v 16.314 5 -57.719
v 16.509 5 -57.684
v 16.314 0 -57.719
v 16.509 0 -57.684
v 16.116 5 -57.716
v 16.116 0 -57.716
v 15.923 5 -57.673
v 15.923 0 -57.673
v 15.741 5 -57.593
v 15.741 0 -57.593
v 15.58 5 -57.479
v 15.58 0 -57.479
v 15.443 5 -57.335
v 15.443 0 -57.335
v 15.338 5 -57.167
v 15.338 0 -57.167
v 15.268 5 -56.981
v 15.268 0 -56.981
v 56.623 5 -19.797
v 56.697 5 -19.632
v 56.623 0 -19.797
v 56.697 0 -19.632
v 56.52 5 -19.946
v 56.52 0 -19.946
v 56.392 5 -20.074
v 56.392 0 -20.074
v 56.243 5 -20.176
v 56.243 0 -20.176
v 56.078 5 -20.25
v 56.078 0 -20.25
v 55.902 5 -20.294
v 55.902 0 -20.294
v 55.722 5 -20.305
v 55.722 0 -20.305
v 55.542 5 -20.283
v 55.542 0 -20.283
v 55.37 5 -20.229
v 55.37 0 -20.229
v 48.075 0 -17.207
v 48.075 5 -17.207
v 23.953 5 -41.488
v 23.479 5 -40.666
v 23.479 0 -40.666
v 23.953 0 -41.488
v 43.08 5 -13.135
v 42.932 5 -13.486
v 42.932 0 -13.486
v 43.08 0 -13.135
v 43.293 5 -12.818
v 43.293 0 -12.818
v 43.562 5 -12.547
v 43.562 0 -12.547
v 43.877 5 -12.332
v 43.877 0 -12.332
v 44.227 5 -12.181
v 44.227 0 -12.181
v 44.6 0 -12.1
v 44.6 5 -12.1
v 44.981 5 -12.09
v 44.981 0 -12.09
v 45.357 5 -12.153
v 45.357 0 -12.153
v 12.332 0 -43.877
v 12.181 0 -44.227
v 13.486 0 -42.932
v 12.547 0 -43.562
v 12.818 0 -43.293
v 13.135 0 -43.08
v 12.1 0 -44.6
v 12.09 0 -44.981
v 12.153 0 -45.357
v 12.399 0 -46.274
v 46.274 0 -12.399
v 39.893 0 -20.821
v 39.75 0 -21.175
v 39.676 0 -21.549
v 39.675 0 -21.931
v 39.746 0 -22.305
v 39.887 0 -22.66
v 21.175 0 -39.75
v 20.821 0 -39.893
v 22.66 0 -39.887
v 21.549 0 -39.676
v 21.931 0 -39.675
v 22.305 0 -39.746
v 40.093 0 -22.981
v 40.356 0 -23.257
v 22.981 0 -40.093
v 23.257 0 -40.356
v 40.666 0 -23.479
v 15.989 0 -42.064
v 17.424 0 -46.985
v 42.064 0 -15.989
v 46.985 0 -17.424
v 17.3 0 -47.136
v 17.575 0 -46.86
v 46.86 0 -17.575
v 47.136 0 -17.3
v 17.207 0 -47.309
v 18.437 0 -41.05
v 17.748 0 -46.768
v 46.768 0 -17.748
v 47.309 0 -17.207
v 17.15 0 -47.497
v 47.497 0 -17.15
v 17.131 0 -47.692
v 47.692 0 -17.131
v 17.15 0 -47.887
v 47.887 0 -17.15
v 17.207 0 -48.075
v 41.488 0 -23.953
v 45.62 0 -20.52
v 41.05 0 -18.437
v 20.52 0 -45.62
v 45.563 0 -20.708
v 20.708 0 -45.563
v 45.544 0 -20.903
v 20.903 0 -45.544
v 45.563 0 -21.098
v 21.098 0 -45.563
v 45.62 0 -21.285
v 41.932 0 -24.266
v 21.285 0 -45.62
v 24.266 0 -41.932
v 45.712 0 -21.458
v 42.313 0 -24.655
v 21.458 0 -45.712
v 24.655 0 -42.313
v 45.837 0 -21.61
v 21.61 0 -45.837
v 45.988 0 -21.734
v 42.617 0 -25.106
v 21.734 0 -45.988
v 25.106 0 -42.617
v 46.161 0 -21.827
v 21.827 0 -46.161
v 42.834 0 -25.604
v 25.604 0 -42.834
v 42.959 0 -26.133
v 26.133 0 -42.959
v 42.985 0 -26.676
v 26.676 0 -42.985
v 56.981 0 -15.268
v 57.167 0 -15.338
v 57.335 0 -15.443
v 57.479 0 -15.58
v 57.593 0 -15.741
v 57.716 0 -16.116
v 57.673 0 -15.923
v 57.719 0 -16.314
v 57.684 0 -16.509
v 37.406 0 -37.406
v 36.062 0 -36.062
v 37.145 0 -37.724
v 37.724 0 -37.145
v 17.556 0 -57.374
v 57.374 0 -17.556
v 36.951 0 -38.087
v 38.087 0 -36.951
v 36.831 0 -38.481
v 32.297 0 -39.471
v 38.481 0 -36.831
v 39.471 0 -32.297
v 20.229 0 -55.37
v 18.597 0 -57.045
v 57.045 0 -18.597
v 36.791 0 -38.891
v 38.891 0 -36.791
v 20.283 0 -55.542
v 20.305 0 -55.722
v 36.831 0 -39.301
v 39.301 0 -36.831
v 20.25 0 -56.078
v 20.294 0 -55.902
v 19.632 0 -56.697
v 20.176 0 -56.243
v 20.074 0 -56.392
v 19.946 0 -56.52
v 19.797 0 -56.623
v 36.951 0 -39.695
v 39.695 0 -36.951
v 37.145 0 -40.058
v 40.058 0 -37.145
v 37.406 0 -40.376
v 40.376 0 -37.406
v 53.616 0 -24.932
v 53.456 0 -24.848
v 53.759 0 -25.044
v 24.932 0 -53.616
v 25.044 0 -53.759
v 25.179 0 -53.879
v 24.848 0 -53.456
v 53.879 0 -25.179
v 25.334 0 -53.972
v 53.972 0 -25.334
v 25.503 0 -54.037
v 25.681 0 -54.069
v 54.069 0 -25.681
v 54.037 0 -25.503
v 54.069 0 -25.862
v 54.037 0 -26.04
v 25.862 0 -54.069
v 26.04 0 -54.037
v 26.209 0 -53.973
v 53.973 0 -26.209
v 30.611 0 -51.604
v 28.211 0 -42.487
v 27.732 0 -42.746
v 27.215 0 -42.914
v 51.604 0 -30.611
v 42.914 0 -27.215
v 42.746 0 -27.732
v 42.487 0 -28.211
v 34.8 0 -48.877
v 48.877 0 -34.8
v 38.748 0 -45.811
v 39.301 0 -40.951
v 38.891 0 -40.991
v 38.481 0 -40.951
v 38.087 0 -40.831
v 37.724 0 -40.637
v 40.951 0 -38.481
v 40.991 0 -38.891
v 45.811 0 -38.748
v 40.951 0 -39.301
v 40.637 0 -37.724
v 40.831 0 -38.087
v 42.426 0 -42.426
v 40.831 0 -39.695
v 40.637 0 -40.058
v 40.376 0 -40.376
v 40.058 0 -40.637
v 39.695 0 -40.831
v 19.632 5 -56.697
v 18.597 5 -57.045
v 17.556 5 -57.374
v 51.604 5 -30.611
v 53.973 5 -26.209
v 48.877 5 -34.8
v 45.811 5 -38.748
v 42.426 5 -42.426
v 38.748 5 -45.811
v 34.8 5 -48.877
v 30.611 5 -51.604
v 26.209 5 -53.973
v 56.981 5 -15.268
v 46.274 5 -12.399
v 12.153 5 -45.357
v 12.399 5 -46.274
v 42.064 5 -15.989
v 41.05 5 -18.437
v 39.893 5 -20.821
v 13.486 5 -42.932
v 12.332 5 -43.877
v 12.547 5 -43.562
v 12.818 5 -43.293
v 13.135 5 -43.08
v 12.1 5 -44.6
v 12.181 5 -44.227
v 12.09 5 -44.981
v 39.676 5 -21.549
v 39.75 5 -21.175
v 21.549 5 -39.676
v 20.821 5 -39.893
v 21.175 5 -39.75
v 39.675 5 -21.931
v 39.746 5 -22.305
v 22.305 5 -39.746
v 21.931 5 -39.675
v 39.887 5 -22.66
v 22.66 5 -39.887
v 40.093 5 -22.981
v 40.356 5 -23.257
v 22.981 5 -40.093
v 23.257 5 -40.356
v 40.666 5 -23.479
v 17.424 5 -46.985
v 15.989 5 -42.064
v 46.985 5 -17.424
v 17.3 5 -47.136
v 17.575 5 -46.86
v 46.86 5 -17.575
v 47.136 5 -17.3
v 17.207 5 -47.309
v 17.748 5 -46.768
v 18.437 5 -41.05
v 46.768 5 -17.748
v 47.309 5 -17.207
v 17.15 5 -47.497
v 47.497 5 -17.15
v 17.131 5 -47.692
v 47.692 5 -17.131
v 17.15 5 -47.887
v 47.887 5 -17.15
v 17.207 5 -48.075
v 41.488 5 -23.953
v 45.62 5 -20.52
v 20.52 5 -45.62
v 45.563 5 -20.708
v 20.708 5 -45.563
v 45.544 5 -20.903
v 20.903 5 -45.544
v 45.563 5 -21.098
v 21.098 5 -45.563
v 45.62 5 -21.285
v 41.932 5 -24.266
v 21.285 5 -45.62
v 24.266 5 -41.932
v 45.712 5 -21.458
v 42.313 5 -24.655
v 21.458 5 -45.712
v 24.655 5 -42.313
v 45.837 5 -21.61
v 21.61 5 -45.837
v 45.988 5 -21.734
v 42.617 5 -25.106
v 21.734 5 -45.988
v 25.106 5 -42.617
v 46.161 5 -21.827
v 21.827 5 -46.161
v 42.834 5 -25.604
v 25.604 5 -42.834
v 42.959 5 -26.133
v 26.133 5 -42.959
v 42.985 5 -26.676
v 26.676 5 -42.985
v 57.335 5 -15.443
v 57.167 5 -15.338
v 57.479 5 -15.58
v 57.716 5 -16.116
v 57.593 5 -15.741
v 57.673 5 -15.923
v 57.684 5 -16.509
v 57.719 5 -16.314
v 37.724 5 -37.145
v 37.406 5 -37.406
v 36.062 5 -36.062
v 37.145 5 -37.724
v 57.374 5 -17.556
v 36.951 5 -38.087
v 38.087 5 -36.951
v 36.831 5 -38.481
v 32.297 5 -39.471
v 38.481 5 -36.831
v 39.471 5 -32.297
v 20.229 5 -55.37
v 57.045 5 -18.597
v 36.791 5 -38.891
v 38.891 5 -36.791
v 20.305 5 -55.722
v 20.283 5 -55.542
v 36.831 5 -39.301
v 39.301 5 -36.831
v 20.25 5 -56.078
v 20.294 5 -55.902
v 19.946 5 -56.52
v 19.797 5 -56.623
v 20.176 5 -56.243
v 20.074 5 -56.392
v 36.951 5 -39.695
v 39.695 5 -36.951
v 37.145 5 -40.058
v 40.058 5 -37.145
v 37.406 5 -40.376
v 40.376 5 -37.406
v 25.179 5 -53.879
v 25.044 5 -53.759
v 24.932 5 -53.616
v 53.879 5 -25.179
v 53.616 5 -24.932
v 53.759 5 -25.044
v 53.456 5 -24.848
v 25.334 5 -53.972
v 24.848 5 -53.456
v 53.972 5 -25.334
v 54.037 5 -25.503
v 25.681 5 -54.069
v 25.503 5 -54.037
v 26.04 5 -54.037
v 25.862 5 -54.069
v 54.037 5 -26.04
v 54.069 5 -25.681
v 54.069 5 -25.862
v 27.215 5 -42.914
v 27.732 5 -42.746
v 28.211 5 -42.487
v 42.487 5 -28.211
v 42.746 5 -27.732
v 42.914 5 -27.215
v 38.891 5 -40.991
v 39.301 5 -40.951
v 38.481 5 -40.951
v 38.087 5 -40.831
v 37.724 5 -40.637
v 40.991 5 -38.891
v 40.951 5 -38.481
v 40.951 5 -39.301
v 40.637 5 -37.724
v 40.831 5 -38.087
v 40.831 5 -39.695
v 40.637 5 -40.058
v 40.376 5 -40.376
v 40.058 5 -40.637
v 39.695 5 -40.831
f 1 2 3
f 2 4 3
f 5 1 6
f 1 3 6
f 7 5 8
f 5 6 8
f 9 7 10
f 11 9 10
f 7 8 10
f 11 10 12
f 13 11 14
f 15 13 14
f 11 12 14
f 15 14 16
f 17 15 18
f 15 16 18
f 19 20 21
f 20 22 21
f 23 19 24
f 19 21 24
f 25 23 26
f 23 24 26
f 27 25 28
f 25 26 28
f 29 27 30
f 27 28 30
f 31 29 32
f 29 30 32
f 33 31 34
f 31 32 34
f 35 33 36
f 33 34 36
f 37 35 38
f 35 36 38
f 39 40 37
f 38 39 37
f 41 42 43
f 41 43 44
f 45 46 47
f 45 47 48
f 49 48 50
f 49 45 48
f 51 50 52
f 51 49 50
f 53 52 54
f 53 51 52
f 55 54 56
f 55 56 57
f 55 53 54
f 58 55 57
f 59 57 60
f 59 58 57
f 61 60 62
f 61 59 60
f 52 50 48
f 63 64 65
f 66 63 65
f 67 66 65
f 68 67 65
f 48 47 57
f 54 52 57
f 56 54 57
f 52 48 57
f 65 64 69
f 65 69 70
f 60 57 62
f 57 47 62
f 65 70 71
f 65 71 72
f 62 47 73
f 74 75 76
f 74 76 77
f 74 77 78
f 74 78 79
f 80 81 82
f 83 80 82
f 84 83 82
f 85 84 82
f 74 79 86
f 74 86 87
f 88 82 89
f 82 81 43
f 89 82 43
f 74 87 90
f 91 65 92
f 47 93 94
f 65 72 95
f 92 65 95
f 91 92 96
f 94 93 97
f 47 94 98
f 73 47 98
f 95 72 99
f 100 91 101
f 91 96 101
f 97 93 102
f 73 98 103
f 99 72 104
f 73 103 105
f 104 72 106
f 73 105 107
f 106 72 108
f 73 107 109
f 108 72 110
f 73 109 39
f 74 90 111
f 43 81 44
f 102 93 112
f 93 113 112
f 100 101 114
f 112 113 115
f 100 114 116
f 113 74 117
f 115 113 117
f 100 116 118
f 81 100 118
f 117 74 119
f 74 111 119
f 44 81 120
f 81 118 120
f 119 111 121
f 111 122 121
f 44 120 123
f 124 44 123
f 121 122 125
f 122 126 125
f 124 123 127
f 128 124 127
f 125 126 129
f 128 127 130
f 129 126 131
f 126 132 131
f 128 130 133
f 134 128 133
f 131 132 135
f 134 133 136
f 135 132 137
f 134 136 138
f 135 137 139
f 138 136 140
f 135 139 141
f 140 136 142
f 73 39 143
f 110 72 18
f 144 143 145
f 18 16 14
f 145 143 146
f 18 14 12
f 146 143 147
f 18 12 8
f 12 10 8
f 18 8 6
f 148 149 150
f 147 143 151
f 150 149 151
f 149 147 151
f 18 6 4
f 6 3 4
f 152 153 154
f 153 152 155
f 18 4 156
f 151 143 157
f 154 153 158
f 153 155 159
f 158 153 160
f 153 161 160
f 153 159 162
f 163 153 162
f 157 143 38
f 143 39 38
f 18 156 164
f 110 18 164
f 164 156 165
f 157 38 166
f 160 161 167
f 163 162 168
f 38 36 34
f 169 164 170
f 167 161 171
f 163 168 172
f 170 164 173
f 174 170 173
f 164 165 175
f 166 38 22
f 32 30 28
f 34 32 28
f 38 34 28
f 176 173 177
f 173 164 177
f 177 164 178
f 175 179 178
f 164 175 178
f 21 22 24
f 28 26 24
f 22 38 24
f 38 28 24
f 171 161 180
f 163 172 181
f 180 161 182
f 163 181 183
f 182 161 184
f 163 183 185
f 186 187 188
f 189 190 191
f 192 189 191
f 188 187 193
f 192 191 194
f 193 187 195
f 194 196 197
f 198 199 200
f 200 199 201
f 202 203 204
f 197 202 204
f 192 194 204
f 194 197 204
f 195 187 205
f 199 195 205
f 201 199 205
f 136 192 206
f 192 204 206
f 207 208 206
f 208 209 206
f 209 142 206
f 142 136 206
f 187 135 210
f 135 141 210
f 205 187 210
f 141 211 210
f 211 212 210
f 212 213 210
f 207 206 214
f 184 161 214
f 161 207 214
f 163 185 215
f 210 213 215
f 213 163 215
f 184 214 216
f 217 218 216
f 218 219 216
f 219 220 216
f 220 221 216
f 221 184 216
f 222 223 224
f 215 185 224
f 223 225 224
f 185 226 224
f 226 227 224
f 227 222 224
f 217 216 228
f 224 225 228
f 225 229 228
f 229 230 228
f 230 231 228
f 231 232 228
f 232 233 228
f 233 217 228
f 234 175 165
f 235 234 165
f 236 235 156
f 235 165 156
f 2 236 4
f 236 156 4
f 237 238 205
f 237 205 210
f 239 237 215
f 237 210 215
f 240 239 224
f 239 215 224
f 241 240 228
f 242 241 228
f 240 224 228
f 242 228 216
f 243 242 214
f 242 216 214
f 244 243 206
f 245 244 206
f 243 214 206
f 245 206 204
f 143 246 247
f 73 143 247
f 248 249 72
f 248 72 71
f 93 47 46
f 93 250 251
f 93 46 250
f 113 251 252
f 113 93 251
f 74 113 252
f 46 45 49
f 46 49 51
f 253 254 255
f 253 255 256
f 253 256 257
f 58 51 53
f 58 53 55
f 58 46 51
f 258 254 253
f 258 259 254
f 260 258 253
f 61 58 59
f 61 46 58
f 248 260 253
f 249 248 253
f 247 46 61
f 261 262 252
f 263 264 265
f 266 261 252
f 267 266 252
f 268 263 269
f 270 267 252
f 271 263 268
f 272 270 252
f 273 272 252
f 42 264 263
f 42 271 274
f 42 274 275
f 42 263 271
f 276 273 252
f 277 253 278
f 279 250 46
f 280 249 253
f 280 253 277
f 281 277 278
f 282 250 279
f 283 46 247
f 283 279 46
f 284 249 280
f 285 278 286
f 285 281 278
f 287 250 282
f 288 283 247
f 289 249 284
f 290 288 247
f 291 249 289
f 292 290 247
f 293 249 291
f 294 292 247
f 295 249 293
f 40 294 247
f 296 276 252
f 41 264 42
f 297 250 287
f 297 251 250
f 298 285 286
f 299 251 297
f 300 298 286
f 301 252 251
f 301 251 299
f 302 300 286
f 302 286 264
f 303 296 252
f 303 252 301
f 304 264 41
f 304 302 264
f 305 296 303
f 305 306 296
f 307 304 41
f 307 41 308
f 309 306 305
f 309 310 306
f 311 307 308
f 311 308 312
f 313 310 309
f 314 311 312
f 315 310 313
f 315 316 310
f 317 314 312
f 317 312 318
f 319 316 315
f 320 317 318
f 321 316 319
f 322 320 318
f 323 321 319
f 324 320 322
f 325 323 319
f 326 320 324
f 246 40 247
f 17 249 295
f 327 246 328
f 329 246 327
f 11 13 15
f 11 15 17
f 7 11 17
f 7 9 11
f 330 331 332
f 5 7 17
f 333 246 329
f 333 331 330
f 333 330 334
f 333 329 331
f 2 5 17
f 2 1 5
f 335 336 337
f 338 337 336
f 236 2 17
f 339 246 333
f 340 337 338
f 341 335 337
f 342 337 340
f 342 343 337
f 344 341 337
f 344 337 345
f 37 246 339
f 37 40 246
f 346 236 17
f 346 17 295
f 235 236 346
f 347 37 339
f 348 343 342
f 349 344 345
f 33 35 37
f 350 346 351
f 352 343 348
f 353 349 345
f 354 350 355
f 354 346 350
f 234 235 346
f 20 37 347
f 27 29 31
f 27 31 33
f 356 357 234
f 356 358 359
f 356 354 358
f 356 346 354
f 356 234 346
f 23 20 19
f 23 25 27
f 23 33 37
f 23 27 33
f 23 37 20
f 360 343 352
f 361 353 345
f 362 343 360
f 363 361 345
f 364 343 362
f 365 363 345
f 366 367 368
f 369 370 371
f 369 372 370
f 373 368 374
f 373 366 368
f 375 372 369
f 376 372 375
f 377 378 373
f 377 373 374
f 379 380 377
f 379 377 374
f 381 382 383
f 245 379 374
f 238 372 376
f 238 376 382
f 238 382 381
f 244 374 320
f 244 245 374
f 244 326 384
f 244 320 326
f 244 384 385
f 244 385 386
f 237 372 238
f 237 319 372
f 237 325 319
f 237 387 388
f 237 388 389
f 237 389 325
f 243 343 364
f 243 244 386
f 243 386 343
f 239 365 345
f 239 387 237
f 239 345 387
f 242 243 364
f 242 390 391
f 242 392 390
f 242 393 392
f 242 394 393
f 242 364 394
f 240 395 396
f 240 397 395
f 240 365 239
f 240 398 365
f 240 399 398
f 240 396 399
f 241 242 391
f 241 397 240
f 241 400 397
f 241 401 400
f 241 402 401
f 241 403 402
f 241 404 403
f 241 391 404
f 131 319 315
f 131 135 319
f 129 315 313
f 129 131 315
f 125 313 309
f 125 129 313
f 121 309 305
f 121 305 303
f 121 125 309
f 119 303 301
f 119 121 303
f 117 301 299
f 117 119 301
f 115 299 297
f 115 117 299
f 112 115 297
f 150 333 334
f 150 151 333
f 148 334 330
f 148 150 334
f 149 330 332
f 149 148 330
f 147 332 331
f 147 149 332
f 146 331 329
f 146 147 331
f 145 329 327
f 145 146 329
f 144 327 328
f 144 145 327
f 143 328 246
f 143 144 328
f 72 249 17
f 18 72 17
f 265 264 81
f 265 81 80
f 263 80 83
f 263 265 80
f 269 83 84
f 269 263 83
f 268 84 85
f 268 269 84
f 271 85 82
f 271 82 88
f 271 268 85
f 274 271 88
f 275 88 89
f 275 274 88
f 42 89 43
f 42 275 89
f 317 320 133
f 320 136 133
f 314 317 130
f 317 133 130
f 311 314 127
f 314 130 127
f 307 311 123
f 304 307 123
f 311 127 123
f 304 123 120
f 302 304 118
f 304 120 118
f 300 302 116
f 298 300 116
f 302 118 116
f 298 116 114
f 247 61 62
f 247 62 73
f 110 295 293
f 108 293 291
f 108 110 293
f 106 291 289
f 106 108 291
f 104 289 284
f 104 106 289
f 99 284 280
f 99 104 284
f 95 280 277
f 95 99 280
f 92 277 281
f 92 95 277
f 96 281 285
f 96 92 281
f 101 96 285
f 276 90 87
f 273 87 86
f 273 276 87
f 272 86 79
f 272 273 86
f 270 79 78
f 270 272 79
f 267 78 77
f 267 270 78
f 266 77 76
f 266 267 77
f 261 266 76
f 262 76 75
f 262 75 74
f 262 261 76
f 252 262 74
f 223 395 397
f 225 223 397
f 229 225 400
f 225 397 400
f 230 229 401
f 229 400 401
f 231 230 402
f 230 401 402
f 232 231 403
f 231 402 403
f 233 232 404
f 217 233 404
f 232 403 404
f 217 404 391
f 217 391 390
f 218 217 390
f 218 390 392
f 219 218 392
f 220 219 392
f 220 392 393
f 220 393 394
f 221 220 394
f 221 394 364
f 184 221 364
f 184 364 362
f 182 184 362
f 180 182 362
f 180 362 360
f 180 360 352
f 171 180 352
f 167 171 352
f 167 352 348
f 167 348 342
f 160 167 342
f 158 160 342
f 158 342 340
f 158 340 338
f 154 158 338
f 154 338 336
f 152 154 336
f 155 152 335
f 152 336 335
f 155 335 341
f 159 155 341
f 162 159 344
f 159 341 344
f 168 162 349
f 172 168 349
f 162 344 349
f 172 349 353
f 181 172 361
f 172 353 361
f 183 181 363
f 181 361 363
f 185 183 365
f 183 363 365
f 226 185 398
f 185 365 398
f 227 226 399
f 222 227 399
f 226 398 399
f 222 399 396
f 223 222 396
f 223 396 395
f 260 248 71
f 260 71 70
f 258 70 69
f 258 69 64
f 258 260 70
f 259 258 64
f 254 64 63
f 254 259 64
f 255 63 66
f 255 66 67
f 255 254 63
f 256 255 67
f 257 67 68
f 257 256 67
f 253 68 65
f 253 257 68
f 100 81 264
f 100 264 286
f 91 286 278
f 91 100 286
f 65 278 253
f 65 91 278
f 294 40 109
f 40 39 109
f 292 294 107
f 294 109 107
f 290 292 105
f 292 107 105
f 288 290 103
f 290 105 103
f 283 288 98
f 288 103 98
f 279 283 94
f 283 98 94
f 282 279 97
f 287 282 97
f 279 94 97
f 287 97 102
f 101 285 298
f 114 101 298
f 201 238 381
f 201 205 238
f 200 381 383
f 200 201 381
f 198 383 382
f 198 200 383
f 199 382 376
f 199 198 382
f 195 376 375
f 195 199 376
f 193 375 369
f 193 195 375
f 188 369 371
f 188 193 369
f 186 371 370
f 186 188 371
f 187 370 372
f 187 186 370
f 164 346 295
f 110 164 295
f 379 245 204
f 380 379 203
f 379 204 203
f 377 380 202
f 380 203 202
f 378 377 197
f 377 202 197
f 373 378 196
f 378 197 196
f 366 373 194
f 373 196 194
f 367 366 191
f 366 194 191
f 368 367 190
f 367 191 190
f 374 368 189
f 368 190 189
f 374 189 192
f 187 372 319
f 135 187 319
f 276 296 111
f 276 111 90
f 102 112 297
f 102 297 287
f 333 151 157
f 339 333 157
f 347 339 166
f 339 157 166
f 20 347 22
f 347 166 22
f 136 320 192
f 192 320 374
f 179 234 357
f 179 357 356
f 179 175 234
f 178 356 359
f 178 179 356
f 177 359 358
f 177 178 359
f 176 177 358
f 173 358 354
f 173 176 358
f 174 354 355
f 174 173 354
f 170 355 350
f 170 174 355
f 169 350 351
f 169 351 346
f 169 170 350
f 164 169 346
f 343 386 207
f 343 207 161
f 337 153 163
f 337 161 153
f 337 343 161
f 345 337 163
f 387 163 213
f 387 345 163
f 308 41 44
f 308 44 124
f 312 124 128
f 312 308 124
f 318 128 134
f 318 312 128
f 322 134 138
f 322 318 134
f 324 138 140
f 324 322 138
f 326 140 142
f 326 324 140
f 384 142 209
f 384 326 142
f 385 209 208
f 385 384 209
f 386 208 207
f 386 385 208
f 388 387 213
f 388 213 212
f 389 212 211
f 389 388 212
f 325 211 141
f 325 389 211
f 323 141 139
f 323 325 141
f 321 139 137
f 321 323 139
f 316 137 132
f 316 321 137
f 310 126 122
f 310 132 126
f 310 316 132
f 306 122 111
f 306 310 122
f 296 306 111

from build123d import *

# Parameters (mm, degrees)
SKETCH1_R                       = 60
SKETCH1_R_2                     = 45
BOSS_EXTRUDE1_DEPTH             = 5
CUT_EXTRUDE1_DEPTH              = 6
CIRPATTERN1_COUNT               = 8
SKETCH3_R                       = 2.1
CUT_EXTRUDE2_DEPTH              = 6
CIRPATTERN2_COUNT               = 4
SKIZZE1_OUTSIDE_W               = 155.956
SKIZZE1_OUTSIDE_H               = 155.956
SCHNITT_LINEAR_AUSTRAGEN1_DEPTH = 6
VERRUNDUNG1_R                   = 1
SCHNITT_LINEAR_AUSTRAGEN2_DEPTH = 6
VERRUNDUNG2_R                   = 1
KREISMUSTER1_COUNT              = 2
KREISMUSTER1_ANGLE              = 45
VERRUNDUNG2_OF_KREISMUSTER1_R   = 1


with BuildPart() as part:
    # Sketch1 → Boss-Extrude1 (new body)
    with BuildSketch(Plane(origin=(0, 0, 0), x_dir=(1, 0, 0), z_dir=(0, 1, 0))):
        Circle(SKETCH1_R)
        Circle(SKETCH1_R_2, mode=Mode.SUBTRACT)
    extrude(amount=BOSS_EXTRUDE1_DEPTH)

    # Sketch2 → Cut-Extrude1 (cut, through all)
    with BuildSketch(Plane(origin=(0, 5, 0), x_dir=(1, 0, 0), z_dir=(0, 1, 0))):
        with BuildLine():
            Line((12.399026137, 46.273795509), (12.153476553, 45.357391985))
            ThreePointArc((12.153476553, 45.357391985), (12.332388249, 43.876840862), (13.485952537, 42.931679261))
            Line((13.485952537, 42.931679261), (-13.485952537, 42.931679261))
            ThreePointArc((-13.485952537, 42.931679261), (-12.332388249, 43.876840862), (-12.153476553, 45.357391985))
            Line((-12.153476553, 45.357391985), (-12.399026137, 46.273795509))
            ThreePointArc((-12.399026137, 46.273795509), (-12.051156799, 48.63074892), (-10.0950767, 49.990893435))
            ThreePointArc((-10.0950767, 49.990893435), (0, 51), (10.0950767, 49.990893435))
            ThreePointArc((10.0950767, 49.990893435), (12.051156799, 48.63074892), (12.399026137, 46.273795509))
        make_face()
    cut_extrude1 = extrude(amount=-CUT_EXTRUDE1_DEPTH, mode=Mode.SUBTRACT)

    # CirPattern1: Cut-Extrude1 ×8 about axis
    cirpattern1_axis = Axis((0, 0, 0), (0, 1, 0))
    for i in range(1, CIRPATTERN1_COUNT):
        add(cut_extrude1.rotate(cirpattern1_axis, i * 360 / CIRPATTERN1_COUNT), mode=Mode.SUBTRACT)

    # Sketch3 → Cut-Extrude2 (cut, through all)
    with BuildSketch(Plane(origin=(0, 5, 0), x_dir=(1, 0, 0), z_dir=(0, 1, 0))):
        with Locations((38.890872965, 38.890872965)):
            Circle(SKETCH3_R)
    cut_extrude2 = extrude(amount=-CUT_EXTRUDE2_DEPTH, mode=Mode.SUBTRACT)

    # CirPattern2: Cut-Extrude2 ×4 about axis
    cirpattern2_axis = Axis((0, 0, 0), (0, 1, 0))
    for i in range(1, CIRPATTERN2_COUNT):
        add(cut_extrude2.rotate(cirpattern2_axis, i * 360 / CIRPATTERN2_COUNT), mode=Mode.SUBTRACT)

    # Skizze1 outside → Schnitt-Linear austragen1 (cut, through all)
    with BuildSketch(Plane(origin=(0, 5, 0), x_dir=(1, 0, 0), z_dir=(0, 1, 0))):
        Rectangle(SKIZZE1_OUTSIDE_W, SKIZZE1_OUTSIDE_H)
        Polygon((0, 0), (24.798052275, 92.547591019), (92.547591019, 24.798052275), align=None, mode=Mode.SUBTRACT)
    extrude(amount=-SCHNITT_LINEAR_AUSTRAGEN1_DEPTH, mode=Mode.SUBTRACT)

    # Verrundung1
    verrundung1_edges = [part.edges().sort_by_distance(p)[0] for p in [
        (57.955549577, 2.5, -15.529142706),
        (15.529142706, 2.5, -57.955549577),
    ]]
    fillet(verrundung1_edges, radius=VERRUNDUNG1_R)

    # Skizze2 → Schnitt-Linear austragen2 (cut, through all)
    with BuildSketch(Plane(origin=(0, 5, 0), x_dir=(1, 0, 0), z_dir=(0, 1, 0))):
        Polygon((16.824472787, 47.150685206), (21.44387045, 45.237268045), (25.270704773, 54.47606337), (20.651307111, 56.389480532), align=None)
    schnitt_linear_austragen2 = extrude(amount=-SCHNITT_LINEAR_AUSTRAGEN2_DEPTH, mode=Mode.SUBTRACT)

    # Verrundung2
    verrundung2_edges = [part.edges().sort_by_distance(p)[0] for p in [
        (20.631367024, 2.5, -56.341340903),
        (25.250764686, 2.5, -54.427923741),
        (16.824472787, 2.5, -47.150685206),
        (21.44387045, 2.5, -45.237268045),
    ]]
    fillet(verrundung2_edges, radius=VERRUNDUNG2_R)

    # Kreismuster1: Schnitt-Linear austragen2 ×2 about axis
    kreismuster1_axis = Axis((0, 0, 0), (0, -1, 0))
    for i in range(1, KREISMUSTER1_COUNT):
        add(schnitt_linear_austragen2.rotate(kreismuster1_axis, i * KREISMUSTER1_ANGLE / (KREISMUSTER1_COUNT - 1)), mode=Mode.SUBTRACT)

    # Verrundung2 of Kreismuster1
    verrundung2_of_kreismuster1_edges = [part.edges().sort_by_distance(p)[0] for p in [
        (54.427923741, 2.5, -25.250764686),
        (56.341340903, 2.5, -20.631367024),
        (45.237268045, 2.5, -21.44387045),
        (47.150685206, 2.5, -16.824472787),
    ]]
    fillet(verrundung2_of_kreismuster1_edges, radius=VERRUNDUNG2_OF_KREISMUSTER1_R)


solid = part.part
